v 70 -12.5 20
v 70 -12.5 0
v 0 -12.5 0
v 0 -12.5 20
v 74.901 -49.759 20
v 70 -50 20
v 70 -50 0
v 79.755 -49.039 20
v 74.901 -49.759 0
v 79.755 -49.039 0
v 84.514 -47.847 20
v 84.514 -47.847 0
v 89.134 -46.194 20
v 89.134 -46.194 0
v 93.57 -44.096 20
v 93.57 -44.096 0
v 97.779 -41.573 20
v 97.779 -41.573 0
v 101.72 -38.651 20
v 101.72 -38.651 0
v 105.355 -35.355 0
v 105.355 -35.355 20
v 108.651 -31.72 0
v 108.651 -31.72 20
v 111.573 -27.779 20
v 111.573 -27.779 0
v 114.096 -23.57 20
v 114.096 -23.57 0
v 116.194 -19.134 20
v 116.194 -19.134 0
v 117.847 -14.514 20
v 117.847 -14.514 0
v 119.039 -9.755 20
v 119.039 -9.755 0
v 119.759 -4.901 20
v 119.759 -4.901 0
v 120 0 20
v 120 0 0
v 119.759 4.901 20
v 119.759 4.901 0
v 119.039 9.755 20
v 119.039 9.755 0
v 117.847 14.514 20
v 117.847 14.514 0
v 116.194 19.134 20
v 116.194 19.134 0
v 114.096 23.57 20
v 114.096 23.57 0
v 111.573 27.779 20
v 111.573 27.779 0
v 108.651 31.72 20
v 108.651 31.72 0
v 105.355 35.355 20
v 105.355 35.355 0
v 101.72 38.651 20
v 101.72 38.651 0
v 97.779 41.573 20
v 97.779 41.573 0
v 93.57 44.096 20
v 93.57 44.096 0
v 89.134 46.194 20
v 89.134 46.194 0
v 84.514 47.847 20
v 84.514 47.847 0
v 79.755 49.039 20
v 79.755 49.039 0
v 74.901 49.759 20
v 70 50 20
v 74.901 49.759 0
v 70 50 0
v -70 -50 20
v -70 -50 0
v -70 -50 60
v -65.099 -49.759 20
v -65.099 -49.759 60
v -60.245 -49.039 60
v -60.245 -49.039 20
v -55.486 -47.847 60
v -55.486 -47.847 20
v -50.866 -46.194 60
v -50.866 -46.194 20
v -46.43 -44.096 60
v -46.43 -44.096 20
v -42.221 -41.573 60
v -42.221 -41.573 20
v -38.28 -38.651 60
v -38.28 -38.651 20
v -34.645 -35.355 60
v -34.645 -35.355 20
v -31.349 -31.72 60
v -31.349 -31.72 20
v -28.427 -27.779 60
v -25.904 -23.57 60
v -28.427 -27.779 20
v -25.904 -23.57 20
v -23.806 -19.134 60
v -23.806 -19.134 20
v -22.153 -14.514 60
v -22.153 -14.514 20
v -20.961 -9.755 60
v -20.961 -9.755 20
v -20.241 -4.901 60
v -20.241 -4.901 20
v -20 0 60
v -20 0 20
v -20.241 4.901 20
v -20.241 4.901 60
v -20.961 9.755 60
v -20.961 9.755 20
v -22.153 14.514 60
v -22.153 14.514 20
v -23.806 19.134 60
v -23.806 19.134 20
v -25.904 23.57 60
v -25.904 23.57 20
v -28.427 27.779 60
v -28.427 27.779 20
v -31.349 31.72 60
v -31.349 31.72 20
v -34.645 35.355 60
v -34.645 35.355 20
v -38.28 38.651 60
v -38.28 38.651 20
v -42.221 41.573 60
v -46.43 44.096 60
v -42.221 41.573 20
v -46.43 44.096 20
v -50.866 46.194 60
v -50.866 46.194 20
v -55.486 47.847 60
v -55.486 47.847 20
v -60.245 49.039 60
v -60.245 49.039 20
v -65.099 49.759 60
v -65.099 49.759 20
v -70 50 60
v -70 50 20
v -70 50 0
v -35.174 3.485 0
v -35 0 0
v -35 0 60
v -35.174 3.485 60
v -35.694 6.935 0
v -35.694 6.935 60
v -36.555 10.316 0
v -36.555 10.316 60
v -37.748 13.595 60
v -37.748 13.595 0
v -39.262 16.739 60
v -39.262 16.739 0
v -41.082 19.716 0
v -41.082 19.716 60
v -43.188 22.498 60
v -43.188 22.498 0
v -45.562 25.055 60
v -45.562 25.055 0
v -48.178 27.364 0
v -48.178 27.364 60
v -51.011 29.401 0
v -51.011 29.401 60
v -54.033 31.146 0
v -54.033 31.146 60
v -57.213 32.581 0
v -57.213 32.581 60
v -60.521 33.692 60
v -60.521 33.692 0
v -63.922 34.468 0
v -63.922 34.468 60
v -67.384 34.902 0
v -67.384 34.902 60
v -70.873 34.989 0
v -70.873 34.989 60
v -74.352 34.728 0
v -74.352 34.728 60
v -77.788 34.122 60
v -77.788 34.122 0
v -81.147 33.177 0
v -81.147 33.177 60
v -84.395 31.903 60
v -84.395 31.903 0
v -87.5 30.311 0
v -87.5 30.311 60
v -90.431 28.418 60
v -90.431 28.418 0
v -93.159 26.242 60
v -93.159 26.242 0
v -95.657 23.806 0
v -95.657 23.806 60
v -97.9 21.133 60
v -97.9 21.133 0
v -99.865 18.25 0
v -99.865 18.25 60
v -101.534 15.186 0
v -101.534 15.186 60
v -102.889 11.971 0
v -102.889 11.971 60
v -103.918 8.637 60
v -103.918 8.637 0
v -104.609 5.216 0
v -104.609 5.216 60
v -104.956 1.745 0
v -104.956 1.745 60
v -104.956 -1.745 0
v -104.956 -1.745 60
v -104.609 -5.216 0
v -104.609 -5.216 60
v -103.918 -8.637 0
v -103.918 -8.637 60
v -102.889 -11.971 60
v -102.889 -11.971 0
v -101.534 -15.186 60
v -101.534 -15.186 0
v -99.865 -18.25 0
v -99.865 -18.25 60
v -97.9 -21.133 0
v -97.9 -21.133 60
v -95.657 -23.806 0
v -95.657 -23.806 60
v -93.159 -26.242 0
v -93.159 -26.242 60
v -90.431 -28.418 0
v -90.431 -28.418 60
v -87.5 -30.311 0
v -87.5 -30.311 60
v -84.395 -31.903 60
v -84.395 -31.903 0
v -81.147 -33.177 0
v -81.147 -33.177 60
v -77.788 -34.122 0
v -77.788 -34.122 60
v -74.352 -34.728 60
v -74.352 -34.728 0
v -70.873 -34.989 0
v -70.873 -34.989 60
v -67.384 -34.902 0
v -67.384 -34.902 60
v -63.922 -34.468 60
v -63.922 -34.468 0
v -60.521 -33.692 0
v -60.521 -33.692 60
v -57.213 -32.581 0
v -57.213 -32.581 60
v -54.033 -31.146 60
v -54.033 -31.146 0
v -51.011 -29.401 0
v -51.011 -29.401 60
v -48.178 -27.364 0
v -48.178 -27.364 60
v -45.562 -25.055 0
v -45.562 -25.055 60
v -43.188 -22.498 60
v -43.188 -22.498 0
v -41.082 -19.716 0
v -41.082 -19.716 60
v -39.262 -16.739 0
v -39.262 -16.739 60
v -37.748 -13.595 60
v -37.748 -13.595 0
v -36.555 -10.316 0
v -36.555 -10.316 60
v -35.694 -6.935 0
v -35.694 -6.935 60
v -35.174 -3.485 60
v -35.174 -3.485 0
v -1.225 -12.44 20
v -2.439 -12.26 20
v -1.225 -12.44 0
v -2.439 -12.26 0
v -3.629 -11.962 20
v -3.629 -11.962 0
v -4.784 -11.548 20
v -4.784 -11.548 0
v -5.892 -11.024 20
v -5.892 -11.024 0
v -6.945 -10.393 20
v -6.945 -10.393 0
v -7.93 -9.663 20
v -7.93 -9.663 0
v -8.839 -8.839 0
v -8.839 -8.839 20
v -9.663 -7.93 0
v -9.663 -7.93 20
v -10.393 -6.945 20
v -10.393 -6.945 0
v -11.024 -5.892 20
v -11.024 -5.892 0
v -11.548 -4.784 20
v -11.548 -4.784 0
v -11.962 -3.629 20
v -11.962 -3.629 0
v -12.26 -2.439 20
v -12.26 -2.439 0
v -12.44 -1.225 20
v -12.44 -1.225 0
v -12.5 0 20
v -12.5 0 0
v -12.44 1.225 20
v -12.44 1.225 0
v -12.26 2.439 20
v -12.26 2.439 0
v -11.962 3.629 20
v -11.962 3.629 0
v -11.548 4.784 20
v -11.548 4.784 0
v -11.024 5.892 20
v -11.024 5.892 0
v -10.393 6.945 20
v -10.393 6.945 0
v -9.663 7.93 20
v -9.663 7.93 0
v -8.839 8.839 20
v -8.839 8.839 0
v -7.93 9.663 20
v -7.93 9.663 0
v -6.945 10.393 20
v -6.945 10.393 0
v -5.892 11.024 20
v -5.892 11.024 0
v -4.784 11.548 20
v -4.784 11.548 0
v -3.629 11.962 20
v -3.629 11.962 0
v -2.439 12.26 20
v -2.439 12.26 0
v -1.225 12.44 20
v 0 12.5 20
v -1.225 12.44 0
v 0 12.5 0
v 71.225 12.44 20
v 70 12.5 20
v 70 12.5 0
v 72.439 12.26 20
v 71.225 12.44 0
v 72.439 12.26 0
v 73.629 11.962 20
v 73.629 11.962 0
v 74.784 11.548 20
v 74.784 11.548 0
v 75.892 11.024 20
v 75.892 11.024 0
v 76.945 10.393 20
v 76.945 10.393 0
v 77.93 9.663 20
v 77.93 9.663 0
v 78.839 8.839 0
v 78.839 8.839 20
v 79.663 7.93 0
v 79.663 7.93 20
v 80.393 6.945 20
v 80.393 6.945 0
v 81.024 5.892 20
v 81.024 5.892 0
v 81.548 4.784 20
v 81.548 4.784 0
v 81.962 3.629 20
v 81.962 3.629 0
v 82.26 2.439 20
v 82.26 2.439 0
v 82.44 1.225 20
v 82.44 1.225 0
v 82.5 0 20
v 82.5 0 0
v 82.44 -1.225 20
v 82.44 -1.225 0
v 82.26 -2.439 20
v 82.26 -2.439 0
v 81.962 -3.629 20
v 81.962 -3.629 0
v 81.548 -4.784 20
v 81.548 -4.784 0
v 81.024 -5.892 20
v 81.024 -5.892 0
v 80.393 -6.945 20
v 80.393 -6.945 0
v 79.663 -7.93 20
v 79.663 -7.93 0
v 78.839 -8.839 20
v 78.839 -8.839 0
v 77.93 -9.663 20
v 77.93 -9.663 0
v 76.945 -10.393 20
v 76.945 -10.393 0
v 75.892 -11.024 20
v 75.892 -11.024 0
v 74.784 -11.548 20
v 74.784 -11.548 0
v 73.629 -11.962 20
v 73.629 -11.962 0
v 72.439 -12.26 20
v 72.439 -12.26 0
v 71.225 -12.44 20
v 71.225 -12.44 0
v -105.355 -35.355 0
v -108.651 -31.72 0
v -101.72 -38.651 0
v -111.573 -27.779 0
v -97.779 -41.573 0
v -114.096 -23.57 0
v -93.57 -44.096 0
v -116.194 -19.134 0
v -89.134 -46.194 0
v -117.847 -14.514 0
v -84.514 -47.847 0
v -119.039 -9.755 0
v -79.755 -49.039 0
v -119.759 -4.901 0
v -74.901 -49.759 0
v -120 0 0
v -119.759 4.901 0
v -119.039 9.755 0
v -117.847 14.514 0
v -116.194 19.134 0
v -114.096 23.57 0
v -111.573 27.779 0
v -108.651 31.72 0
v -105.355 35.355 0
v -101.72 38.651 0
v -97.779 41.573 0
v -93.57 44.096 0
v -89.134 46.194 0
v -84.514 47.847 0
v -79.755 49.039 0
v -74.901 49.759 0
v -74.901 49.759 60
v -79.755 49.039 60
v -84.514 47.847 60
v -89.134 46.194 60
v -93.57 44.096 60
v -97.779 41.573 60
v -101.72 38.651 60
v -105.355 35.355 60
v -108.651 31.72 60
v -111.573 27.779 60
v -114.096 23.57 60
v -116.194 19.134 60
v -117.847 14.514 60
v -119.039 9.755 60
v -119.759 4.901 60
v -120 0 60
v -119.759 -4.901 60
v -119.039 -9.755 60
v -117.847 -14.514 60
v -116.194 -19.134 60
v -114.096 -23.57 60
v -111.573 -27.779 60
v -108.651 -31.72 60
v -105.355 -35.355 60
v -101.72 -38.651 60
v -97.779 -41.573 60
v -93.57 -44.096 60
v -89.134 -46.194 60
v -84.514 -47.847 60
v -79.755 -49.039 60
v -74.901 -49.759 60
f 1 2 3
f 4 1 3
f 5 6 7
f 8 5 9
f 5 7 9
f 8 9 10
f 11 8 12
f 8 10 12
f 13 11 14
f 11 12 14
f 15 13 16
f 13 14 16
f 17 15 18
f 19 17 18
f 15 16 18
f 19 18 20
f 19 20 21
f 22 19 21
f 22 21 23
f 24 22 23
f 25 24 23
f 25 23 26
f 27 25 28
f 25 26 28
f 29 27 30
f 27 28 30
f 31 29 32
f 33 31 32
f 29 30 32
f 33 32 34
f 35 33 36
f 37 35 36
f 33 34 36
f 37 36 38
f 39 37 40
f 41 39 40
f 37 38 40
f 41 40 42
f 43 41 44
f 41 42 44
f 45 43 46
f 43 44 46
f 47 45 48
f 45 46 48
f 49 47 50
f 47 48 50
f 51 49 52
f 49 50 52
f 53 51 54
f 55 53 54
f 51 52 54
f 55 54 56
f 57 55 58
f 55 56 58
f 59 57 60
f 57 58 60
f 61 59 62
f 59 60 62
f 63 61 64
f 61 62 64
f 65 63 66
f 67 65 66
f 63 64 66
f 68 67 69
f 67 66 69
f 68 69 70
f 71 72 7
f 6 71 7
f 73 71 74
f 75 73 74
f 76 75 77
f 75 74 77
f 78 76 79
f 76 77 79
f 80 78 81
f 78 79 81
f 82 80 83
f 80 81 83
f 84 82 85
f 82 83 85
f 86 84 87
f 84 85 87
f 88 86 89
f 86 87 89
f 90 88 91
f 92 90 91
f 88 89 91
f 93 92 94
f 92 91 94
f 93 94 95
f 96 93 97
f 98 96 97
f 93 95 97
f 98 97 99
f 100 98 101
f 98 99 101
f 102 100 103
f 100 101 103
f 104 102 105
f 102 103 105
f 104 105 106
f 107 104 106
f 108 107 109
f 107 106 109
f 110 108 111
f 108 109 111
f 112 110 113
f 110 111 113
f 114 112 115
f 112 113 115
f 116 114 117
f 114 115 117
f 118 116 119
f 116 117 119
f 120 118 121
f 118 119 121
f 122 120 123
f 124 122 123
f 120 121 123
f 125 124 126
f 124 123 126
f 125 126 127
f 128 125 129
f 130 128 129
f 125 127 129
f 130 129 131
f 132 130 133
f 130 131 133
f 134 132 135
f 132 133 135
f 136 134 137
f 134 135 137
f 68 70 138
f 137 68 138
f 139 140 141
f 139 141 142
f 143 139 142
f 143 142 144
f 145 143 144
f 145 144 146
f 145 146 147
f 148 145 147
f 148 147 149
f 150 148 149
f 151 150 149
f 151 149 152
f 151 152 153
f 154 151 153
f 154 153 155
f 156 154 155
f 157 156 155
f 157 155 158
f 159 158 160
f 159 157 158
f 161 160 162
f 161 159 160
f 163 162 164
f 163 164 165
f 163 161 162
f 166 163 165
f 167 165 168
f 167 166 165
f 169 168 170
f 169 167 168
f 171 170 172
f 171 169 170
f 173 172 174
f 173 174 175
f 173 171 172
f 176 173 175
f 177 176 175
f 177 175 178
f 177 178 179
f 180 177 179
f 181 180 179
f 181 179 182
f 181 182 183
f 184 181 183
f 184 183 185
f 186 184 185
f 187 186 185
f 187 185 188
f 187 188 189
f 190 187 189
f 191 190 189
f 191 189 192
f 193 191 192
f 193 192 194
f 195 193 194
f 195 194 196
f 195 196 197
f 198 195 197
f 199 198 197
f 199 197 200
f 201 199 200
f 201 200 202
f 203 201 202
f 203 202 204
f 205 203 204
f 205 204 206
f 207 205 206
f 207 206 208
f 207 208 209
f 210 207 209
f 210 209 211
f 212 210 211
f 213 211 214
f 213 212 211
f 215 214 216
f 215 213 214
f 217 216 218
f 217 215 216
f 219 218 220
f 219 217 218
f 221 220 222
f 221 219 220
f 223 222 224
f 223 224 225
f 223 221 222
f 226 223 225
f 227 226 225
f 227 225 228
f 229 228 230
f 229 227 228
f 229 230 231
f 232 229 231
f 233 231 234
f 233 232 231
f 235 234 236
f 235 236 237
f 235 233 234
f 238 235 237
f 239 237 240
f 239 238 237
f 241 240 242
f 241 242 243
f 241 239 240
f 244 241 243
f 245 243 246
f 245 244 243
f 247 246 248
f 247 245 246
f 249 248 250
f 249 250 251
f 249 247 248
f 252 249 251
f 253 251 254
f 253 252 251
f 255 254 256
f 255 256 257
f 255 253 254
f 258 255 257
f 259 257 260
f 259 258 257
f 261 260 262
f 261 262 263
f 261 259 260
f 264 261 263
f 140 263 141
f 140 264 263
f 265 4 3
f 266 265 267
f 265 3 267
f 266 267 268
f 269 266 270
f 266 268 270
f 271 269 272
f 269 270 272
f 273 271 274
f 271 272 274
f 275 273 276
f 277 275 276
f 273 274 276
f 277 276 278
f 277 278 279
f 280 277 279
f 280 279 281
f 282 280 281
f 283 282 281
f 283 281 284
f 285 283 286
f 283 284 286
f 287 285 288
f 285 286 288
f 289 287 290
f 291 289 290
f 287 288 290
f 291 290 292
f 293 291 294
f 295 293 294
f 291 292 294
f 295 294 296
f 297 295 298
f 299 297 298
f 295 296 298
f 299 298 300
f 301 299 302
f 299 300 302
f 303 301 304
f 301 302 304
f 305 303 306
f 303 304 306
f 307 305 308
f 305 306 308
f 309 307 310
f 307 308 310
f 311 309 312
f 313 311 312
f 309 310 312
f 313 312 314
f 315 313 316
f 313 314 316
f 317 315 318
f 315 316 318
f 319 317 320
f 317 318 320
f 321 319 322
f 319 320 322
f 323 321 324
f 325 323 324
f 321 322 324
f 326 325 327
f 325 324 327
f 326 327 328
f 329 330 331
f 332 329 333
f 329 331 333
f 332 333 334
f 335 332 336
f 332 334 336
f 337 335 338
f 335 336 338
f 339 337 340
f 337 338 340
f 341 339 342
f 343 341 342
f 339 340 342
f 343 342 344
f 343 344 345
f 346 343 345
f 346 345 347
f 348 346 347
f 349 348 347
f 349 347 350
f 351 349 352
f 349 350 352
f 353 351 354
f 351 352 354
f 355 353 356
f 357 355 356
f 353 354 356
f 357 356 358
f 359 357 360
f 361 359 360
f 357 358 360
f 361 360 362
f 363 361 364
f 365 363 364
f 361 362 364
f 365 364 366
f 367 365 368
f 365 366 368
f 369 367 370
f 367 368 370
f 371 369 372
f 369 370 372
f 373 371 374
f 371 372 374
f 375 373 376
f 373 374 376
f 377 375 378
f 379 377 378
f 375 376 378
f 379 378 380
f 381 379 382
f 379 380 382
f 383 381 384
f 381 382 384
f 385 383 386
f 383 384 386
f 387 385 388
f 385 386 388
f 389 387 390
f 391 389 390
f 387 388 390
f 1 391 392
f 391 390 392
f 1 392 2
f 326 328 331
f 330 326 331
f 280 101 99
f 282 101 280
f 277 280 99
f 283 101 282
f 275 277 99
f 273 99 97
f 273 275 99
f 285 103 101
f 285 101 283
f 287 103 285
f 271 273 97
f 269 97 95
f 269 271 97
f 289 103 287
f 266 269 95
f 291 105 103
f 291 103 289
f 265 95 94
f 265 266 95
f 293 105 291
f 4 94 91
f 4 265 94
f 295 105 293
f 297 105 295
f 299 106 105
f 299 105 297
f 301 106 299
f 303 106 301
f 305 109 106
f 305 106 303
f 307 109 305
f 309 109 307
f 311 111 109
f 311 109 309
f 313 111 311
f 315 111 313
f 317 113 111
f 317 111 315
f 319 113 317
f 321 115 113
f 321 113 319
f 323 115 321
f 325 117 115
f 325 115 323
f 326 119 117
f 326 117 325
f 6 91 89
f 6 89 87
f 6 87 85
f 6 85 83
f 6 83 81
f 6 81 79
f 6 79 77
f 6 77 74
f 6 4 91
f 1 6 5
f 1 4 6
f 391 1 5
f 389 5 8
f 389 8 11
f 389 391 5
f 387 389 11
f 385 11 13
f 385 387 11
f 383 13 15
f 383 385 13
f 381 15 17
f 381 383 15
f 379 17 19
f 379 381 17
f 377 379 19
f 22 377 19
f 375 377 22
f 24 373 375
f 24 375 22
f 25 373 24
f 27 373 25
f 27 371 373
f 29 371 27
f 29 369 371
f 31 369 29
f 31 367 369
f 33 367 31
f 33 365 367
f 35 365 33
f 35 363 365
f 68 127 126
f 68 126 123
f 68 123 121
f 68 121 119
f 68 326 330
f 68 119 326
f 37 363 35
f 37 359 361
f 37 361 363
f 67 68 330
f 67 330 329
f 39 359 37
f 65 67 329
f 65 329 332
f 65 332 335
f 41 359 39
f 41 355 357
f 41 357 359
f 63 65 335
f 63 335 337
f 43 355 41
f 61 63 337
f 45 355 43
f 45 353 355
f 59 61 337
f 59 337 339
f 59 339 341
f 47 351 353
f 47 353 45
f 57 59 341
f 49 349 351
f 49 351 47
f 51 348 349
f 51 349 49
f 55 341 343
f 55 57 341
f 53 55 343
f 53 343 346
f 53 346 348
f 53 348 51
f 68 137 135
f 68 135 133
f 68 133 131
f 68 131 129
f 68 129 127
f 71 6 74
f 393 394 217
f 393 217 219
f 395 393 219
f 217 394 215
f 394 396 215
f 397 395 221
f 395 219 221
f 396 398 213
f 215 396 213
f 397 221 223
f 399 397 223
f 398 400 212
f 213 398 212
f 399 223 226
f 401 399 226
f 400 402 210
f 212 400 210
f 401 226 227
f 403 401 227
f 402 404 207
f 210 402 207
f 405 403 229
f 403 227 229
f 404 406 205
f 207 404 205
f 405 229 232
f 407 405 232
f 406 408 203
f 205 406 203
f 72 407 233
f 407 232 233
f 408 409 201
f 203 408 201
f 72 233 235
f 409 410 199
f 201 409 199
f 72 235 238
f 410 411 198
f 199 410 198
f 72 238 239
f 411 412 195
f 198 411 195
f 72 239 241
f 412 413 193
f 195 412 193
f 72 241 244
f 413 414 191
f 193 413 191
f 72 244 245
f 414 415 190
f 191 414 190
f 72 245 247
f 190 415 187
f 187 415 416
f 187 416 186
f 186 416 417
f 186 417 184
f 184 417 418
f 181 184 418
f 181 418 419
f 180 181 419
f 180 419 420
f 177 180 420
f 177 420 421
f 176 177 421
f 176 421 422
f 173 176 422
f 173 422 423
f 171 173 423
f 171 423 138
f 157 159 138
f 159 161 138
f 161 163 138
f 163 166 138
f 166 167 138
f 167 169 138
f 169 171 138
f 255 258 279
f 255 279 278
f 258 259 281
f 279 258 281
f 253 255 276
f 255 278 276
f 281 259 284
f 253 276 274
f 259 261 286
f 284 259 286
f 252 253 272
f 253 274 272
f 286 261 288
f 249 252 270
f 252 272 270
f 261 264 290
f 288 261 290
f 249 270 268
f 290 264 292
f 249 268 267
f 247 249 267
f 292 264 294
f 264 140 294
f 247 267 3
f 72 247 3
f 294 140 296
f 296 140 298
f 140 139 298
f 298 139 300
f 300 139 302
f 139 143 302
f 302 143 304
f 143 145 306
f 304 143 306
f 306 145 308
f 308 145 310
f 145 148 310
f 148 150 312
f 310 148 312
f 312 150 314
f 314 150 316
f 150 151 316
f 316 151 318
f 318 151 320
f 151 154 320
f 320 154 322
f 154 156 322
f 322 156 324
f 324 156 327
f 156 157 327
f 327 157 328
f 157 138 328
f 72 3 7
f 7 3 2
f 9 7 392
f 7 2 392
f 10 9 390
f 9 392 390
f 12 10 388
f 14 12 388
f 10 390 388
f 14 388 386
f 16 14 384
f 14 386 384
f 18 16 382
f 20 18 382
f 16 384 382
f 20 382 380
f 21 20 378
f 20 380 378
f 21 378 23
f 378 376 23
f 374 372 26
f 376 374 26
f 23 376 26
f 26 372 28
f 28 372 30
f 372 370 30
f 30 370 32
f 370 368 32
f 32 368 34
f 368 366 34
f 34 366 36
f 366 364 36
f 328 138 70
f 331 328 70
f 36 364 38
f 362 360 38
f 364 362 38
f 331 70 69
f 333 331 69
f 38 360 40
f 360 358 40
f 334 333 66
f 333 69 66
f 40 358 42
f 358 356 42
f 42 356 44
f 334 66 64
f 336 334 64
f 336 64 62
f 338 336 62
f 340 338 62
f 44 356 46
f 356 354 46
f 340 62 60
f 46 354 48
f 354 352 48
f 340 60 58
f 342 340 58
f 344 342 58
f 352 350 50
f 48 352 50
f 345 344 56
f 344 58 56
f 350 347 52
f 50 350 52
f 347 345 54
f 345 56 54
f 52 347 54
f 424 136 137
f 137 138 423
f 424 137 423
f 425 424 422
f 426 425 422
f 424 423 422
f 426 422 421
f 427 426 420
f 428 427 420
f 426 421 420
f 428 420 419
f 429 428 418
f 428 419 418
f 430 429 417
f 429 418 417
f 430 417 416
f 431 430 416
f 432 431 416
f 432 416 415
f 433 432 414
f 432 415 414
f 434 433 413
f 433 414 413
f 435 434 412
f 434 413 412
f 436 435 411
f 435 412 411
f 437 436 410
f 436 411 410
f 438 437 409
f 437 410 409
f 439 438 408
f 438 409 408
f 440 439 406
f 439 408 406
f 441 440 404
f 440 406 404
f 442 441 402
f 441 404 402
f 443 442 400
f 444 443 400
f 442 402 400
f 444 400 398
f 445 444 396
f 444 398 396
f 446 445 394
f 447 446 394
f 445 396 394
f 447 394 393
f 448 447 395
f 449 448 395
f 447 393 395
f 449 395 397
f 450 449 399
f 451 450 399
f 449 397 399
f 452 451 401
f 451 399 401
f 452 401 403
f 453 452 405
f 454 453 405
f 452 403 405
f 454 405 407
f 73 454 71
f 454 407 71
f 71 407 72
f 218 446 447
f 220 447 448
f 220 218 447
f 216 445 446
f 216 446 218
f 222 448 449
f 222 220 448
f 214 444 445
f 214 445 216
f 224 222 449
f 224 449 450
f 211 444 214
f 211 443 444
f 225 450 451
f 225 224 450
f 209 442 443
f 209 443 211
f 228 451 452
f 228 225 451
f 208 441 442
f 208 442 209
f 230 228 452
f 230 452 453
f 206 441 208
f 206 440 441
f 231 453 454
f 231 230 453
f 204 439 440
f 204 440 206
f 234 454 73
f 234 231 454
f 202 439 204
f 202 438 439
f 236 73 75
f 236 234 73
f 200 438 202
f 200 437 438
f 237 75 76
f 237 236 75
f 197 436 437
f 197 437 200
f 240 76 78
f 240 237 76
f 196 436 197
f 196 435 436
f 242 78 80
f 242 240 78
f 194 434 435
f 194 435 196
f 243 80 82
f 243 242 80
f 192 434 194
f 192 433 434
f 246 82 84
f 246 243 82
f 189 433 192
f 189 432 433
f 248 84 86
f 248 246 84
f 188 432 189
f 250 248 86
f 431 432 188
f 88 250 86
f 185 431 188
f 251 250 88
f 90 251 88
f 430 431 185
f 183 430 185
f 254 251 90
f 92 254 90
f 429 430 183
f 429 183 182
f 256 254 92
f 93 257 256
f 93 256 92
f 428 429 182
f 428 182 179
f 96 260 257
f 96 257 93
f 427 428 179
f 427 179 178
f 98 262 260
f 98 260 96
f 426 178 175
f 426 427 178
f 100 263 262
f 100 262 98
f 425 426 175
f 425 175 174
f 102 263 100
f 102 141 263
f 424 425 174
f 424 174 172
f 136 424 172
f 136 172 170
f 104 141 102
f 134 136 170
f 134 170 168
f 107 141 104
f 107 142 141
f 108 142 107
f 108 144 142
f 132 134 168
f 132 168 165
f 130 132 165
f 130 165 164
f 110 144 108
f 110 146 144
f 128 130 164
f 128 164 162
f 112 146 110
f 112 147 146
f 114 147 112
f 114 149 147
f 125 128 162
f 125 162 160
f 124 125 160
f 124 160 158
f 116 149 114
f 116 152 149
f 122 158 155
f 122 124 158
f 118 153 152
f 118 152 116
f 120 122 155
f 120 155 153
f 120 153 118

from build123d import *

# Parameters (mm, degrees)
F0_R     = 35
F1_DEPTH = 20
F2_DEPTH = 60


with BuildPart() as f1:
    # F0 (on Top) → F1 (new body)
    with BuildSketch(Plane.XY):
        with BuildLine():
            ThreePointArc((-70, -50), (-34.644661, -35.355339), (-20, 0))
            ThreePointArc((-20, 0), (-34.644661, 35.355339), (-70, 50))
            ThreePointArc((-70, 50), (-120, 0), (-70, -50))
        make_face()
        with Locations((-70, 0)):
            Circle(F0_R, mode=Mode.SUBTRACT)
        with BuildLine():
            ThreePointArc((-70, 50), (-34.644661, 35.355339), (-20, 0))
            ThreePointArc((-20, 0), (-34.644661, -35.355339), (-70, -50))
            Line((-70, -50), (70, -50))
            ThreePointArc((70, -50), (120, 0), (70, 50))
            Line((70, 50), (-70, 50))
        make_face()
        with BuildLine():
            Line((70, -12.5), (0, -12.5))
            ThreePointArc((0, -12.5), (-12.5, 0), (0, 12.5))
            Line((0, 12.5), (70, 12.5))
            ThreePointArc((70, 12.5), (82.5, 0), (70, -12.5))
        make_face(mode=Mode.SUBTRACT)
    extrude(amount=F1_DEPTH)

    # F0 (on Top) → F2 (join)
    with BuildSketch(Plane.XY):
        with BuildLine():
            ThreePointArc((-70, -50), (-34.644661, -35.355339), (-20, 0))
            ThreePointArc((-20, 0), (-34.644661, 35.355339), (-70, 50))
            ThreePointArc((-70, 50), (-120, 0), (-70, -50))
        make_face()
        with Locations((-70, 0)):
            Circle(F0_R, mode=Mode.SUBTRACT)
    extrude(amount=F2_DEPTH)


solid = f1.part
